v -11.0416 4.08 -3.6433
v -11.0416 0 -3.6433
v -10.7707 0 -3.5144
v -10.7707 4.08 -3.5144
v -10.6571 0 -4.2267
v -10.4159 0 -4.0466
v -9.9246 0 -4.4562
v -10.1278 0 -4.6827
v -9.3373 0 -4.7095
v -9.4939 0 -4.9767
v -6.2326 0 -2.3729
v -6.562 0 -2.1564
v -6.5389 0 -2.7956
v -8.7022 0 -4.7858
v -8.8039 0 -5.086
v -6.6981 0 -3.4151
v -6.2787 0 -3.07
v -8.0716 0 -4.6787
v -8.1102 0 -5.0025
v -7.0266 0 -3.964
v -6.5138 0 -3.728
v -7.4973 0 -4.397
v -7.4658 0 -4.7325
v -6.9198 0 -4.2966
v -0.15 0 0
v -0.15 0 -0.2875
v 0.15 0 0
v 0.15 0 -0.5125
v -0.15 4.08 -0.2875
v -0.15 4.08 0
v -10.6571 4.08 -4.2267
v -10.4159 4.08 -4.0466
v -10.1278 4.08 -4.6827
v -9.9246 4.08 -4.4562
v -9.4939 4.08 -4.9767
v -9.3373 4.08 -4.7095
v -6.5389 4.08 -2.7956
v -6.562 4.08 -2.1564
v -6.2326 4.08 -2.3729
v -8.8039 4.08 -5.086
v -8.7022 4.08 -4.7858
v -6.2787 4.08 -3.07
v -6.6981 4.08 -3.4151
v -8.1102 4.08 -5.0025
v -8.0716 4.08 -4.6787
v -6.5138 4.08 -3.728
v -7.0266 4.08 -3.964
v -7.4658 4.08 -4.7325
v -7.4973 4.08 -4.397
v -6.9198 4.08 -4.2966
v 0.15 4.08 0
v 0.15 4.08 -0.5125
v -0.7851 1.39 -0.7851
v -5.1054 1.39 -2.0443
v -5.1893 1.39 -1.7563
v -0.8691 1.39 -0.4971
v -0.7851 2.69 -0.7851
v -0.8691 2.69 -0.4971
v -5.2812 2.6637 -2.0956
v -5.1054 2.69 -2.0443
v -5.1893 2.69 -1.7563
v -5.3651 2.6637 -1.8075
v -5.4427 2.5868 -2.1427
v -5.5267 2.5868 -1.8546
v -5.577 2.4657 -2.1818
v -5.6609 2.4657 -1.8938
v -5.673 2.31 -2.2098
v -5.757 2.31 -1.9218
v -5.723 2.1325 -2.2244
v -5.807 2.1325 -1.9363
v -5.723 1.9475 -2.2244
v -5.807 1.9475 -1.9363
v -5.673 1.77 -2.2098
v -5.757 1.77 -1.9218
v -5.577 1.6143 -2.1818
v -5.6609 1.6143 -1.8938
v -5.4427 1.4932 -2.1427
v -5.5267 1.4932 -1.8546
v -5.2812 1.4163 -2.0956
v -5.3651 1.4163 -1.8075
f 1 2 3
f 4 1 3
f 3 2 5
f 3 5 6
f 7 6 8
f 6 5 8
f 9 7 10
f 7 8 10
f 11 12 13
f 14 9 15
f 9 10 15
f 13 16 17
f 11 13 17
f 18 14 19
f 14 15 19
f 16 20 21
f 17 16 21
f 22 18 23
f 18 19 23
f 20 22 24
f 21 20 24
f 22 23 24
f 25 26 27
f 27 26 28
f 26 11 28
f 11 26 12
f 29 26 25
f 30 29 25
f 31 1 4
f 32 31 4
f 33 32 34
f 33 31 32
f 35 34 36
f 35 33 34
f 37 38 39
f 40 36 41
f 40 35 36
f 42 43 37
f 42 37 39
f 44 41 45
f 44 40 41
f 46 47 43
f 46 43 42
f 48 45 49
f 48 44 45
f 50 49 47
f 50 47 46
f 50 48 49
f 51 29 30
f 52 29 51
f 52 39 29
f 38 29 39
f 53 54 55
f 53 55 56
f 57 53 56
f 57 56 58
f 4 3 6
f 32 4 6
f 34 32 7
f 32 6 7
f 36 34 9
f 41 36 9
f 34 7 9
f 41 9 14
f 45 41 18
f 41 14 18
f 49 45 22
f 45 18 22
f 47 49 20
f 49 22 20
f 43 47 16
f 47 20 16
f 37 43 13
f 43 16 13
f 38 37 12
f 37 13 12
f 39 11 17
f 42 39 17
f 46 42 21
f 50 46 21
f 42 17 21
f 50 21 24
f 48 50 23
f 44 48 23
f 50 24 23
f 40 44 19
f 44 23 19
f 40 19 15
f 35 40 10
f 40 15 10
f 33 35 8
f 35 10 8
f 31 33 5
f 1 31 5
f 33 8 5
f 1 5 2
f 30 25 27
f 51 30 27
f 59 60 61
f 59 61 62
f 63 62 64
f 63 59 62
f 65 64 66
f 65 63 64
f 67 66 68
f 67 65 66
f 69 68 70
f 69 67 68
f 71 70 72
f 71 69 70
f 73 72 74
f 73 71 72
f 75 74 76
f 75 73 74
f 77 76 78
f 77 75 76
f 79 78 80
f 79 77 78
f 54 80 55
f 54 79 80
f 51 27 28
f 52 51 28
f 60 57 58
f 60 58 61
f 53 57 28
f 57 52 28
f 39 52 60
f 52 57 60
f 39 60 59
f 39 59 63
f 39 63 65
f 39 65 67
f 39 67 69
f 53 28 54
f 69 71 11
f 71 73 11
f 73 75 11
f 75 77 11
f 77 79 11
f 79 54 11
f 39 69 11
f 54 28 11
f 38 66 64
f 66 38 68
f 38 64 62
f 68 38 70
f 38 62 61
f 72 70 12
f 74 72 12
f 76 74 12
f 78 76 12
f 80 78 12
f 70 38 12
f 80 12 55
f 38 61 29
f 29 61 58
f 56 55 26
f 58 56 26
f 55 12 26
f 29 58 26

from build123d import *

# Parameters (mm, degrees)
BOSS_EXTRUDE1_DEPTH = 4.08
CUT_EXTRUDE1_DEPTH  = 0.3


with BuildPart() as part:
    # Sketch1 → Boss-Extrude1 (new body)
    with BuildSketch(Plane(origin=(0, 0, 0), x_dir=(1, 0, 0), z_dir=(0, 1, 0))):
        with BuildLine():
            Line((0.15, 0), (0.15, 0.512520873))
            Line((0.15, 0.512520873), (-6.232557616, 2.372866767))
            ThreePointArc((-6.232557616, 2.372866767), (-8.110196222, 5.002527571), (-11.041610225, 3.643316544))
            Line((-11.041610225, 3.643316544), (-10.770722466, 3.514398655))
            ThreePointArc((-10.770722466, 3.514398655), (-8.071596063, 4.67869548), (-6.561988987, 2.156403483))
            Line((-6.561988987, 2.156403483), (-0.15, 0.287479127))
            Line((-0.15, 0.287479127), (-0.15, 0))
            Line((-0.15, 0), (0.15, 0))
        make_face()
    extrude(amount=BOSS_EXTRUDE1_DEPTH)

    # Sketch2 → Cut-Extrude1 (cut)
    with BuildSketch(Plane(origin=(0.149434274, 0, -0.512685767), x_dir=(-0.9600498543859307, 0, -0.27982901403098553), z_dir=(0.27982901403098553, 0, -0.9600498543859307))):
        with BuildLine():
            Line((0.97346461, 1.39), (0.97346461, 2.69))
            Line((0.97346461, 2.69), (5.47346461, 2.69))
            ThreePointArc((5.47346461, 2.69), (6.12346461, 2.04), (5.47346461, 1.39))
            Line((5.47346461, 1.39), (0.97346461, 1.39))
        make_face()
    extrude(amount=-CUT_EXTRUDE1_DEPTH, mode=Mode.SUBTRACT)


solid = part.part
